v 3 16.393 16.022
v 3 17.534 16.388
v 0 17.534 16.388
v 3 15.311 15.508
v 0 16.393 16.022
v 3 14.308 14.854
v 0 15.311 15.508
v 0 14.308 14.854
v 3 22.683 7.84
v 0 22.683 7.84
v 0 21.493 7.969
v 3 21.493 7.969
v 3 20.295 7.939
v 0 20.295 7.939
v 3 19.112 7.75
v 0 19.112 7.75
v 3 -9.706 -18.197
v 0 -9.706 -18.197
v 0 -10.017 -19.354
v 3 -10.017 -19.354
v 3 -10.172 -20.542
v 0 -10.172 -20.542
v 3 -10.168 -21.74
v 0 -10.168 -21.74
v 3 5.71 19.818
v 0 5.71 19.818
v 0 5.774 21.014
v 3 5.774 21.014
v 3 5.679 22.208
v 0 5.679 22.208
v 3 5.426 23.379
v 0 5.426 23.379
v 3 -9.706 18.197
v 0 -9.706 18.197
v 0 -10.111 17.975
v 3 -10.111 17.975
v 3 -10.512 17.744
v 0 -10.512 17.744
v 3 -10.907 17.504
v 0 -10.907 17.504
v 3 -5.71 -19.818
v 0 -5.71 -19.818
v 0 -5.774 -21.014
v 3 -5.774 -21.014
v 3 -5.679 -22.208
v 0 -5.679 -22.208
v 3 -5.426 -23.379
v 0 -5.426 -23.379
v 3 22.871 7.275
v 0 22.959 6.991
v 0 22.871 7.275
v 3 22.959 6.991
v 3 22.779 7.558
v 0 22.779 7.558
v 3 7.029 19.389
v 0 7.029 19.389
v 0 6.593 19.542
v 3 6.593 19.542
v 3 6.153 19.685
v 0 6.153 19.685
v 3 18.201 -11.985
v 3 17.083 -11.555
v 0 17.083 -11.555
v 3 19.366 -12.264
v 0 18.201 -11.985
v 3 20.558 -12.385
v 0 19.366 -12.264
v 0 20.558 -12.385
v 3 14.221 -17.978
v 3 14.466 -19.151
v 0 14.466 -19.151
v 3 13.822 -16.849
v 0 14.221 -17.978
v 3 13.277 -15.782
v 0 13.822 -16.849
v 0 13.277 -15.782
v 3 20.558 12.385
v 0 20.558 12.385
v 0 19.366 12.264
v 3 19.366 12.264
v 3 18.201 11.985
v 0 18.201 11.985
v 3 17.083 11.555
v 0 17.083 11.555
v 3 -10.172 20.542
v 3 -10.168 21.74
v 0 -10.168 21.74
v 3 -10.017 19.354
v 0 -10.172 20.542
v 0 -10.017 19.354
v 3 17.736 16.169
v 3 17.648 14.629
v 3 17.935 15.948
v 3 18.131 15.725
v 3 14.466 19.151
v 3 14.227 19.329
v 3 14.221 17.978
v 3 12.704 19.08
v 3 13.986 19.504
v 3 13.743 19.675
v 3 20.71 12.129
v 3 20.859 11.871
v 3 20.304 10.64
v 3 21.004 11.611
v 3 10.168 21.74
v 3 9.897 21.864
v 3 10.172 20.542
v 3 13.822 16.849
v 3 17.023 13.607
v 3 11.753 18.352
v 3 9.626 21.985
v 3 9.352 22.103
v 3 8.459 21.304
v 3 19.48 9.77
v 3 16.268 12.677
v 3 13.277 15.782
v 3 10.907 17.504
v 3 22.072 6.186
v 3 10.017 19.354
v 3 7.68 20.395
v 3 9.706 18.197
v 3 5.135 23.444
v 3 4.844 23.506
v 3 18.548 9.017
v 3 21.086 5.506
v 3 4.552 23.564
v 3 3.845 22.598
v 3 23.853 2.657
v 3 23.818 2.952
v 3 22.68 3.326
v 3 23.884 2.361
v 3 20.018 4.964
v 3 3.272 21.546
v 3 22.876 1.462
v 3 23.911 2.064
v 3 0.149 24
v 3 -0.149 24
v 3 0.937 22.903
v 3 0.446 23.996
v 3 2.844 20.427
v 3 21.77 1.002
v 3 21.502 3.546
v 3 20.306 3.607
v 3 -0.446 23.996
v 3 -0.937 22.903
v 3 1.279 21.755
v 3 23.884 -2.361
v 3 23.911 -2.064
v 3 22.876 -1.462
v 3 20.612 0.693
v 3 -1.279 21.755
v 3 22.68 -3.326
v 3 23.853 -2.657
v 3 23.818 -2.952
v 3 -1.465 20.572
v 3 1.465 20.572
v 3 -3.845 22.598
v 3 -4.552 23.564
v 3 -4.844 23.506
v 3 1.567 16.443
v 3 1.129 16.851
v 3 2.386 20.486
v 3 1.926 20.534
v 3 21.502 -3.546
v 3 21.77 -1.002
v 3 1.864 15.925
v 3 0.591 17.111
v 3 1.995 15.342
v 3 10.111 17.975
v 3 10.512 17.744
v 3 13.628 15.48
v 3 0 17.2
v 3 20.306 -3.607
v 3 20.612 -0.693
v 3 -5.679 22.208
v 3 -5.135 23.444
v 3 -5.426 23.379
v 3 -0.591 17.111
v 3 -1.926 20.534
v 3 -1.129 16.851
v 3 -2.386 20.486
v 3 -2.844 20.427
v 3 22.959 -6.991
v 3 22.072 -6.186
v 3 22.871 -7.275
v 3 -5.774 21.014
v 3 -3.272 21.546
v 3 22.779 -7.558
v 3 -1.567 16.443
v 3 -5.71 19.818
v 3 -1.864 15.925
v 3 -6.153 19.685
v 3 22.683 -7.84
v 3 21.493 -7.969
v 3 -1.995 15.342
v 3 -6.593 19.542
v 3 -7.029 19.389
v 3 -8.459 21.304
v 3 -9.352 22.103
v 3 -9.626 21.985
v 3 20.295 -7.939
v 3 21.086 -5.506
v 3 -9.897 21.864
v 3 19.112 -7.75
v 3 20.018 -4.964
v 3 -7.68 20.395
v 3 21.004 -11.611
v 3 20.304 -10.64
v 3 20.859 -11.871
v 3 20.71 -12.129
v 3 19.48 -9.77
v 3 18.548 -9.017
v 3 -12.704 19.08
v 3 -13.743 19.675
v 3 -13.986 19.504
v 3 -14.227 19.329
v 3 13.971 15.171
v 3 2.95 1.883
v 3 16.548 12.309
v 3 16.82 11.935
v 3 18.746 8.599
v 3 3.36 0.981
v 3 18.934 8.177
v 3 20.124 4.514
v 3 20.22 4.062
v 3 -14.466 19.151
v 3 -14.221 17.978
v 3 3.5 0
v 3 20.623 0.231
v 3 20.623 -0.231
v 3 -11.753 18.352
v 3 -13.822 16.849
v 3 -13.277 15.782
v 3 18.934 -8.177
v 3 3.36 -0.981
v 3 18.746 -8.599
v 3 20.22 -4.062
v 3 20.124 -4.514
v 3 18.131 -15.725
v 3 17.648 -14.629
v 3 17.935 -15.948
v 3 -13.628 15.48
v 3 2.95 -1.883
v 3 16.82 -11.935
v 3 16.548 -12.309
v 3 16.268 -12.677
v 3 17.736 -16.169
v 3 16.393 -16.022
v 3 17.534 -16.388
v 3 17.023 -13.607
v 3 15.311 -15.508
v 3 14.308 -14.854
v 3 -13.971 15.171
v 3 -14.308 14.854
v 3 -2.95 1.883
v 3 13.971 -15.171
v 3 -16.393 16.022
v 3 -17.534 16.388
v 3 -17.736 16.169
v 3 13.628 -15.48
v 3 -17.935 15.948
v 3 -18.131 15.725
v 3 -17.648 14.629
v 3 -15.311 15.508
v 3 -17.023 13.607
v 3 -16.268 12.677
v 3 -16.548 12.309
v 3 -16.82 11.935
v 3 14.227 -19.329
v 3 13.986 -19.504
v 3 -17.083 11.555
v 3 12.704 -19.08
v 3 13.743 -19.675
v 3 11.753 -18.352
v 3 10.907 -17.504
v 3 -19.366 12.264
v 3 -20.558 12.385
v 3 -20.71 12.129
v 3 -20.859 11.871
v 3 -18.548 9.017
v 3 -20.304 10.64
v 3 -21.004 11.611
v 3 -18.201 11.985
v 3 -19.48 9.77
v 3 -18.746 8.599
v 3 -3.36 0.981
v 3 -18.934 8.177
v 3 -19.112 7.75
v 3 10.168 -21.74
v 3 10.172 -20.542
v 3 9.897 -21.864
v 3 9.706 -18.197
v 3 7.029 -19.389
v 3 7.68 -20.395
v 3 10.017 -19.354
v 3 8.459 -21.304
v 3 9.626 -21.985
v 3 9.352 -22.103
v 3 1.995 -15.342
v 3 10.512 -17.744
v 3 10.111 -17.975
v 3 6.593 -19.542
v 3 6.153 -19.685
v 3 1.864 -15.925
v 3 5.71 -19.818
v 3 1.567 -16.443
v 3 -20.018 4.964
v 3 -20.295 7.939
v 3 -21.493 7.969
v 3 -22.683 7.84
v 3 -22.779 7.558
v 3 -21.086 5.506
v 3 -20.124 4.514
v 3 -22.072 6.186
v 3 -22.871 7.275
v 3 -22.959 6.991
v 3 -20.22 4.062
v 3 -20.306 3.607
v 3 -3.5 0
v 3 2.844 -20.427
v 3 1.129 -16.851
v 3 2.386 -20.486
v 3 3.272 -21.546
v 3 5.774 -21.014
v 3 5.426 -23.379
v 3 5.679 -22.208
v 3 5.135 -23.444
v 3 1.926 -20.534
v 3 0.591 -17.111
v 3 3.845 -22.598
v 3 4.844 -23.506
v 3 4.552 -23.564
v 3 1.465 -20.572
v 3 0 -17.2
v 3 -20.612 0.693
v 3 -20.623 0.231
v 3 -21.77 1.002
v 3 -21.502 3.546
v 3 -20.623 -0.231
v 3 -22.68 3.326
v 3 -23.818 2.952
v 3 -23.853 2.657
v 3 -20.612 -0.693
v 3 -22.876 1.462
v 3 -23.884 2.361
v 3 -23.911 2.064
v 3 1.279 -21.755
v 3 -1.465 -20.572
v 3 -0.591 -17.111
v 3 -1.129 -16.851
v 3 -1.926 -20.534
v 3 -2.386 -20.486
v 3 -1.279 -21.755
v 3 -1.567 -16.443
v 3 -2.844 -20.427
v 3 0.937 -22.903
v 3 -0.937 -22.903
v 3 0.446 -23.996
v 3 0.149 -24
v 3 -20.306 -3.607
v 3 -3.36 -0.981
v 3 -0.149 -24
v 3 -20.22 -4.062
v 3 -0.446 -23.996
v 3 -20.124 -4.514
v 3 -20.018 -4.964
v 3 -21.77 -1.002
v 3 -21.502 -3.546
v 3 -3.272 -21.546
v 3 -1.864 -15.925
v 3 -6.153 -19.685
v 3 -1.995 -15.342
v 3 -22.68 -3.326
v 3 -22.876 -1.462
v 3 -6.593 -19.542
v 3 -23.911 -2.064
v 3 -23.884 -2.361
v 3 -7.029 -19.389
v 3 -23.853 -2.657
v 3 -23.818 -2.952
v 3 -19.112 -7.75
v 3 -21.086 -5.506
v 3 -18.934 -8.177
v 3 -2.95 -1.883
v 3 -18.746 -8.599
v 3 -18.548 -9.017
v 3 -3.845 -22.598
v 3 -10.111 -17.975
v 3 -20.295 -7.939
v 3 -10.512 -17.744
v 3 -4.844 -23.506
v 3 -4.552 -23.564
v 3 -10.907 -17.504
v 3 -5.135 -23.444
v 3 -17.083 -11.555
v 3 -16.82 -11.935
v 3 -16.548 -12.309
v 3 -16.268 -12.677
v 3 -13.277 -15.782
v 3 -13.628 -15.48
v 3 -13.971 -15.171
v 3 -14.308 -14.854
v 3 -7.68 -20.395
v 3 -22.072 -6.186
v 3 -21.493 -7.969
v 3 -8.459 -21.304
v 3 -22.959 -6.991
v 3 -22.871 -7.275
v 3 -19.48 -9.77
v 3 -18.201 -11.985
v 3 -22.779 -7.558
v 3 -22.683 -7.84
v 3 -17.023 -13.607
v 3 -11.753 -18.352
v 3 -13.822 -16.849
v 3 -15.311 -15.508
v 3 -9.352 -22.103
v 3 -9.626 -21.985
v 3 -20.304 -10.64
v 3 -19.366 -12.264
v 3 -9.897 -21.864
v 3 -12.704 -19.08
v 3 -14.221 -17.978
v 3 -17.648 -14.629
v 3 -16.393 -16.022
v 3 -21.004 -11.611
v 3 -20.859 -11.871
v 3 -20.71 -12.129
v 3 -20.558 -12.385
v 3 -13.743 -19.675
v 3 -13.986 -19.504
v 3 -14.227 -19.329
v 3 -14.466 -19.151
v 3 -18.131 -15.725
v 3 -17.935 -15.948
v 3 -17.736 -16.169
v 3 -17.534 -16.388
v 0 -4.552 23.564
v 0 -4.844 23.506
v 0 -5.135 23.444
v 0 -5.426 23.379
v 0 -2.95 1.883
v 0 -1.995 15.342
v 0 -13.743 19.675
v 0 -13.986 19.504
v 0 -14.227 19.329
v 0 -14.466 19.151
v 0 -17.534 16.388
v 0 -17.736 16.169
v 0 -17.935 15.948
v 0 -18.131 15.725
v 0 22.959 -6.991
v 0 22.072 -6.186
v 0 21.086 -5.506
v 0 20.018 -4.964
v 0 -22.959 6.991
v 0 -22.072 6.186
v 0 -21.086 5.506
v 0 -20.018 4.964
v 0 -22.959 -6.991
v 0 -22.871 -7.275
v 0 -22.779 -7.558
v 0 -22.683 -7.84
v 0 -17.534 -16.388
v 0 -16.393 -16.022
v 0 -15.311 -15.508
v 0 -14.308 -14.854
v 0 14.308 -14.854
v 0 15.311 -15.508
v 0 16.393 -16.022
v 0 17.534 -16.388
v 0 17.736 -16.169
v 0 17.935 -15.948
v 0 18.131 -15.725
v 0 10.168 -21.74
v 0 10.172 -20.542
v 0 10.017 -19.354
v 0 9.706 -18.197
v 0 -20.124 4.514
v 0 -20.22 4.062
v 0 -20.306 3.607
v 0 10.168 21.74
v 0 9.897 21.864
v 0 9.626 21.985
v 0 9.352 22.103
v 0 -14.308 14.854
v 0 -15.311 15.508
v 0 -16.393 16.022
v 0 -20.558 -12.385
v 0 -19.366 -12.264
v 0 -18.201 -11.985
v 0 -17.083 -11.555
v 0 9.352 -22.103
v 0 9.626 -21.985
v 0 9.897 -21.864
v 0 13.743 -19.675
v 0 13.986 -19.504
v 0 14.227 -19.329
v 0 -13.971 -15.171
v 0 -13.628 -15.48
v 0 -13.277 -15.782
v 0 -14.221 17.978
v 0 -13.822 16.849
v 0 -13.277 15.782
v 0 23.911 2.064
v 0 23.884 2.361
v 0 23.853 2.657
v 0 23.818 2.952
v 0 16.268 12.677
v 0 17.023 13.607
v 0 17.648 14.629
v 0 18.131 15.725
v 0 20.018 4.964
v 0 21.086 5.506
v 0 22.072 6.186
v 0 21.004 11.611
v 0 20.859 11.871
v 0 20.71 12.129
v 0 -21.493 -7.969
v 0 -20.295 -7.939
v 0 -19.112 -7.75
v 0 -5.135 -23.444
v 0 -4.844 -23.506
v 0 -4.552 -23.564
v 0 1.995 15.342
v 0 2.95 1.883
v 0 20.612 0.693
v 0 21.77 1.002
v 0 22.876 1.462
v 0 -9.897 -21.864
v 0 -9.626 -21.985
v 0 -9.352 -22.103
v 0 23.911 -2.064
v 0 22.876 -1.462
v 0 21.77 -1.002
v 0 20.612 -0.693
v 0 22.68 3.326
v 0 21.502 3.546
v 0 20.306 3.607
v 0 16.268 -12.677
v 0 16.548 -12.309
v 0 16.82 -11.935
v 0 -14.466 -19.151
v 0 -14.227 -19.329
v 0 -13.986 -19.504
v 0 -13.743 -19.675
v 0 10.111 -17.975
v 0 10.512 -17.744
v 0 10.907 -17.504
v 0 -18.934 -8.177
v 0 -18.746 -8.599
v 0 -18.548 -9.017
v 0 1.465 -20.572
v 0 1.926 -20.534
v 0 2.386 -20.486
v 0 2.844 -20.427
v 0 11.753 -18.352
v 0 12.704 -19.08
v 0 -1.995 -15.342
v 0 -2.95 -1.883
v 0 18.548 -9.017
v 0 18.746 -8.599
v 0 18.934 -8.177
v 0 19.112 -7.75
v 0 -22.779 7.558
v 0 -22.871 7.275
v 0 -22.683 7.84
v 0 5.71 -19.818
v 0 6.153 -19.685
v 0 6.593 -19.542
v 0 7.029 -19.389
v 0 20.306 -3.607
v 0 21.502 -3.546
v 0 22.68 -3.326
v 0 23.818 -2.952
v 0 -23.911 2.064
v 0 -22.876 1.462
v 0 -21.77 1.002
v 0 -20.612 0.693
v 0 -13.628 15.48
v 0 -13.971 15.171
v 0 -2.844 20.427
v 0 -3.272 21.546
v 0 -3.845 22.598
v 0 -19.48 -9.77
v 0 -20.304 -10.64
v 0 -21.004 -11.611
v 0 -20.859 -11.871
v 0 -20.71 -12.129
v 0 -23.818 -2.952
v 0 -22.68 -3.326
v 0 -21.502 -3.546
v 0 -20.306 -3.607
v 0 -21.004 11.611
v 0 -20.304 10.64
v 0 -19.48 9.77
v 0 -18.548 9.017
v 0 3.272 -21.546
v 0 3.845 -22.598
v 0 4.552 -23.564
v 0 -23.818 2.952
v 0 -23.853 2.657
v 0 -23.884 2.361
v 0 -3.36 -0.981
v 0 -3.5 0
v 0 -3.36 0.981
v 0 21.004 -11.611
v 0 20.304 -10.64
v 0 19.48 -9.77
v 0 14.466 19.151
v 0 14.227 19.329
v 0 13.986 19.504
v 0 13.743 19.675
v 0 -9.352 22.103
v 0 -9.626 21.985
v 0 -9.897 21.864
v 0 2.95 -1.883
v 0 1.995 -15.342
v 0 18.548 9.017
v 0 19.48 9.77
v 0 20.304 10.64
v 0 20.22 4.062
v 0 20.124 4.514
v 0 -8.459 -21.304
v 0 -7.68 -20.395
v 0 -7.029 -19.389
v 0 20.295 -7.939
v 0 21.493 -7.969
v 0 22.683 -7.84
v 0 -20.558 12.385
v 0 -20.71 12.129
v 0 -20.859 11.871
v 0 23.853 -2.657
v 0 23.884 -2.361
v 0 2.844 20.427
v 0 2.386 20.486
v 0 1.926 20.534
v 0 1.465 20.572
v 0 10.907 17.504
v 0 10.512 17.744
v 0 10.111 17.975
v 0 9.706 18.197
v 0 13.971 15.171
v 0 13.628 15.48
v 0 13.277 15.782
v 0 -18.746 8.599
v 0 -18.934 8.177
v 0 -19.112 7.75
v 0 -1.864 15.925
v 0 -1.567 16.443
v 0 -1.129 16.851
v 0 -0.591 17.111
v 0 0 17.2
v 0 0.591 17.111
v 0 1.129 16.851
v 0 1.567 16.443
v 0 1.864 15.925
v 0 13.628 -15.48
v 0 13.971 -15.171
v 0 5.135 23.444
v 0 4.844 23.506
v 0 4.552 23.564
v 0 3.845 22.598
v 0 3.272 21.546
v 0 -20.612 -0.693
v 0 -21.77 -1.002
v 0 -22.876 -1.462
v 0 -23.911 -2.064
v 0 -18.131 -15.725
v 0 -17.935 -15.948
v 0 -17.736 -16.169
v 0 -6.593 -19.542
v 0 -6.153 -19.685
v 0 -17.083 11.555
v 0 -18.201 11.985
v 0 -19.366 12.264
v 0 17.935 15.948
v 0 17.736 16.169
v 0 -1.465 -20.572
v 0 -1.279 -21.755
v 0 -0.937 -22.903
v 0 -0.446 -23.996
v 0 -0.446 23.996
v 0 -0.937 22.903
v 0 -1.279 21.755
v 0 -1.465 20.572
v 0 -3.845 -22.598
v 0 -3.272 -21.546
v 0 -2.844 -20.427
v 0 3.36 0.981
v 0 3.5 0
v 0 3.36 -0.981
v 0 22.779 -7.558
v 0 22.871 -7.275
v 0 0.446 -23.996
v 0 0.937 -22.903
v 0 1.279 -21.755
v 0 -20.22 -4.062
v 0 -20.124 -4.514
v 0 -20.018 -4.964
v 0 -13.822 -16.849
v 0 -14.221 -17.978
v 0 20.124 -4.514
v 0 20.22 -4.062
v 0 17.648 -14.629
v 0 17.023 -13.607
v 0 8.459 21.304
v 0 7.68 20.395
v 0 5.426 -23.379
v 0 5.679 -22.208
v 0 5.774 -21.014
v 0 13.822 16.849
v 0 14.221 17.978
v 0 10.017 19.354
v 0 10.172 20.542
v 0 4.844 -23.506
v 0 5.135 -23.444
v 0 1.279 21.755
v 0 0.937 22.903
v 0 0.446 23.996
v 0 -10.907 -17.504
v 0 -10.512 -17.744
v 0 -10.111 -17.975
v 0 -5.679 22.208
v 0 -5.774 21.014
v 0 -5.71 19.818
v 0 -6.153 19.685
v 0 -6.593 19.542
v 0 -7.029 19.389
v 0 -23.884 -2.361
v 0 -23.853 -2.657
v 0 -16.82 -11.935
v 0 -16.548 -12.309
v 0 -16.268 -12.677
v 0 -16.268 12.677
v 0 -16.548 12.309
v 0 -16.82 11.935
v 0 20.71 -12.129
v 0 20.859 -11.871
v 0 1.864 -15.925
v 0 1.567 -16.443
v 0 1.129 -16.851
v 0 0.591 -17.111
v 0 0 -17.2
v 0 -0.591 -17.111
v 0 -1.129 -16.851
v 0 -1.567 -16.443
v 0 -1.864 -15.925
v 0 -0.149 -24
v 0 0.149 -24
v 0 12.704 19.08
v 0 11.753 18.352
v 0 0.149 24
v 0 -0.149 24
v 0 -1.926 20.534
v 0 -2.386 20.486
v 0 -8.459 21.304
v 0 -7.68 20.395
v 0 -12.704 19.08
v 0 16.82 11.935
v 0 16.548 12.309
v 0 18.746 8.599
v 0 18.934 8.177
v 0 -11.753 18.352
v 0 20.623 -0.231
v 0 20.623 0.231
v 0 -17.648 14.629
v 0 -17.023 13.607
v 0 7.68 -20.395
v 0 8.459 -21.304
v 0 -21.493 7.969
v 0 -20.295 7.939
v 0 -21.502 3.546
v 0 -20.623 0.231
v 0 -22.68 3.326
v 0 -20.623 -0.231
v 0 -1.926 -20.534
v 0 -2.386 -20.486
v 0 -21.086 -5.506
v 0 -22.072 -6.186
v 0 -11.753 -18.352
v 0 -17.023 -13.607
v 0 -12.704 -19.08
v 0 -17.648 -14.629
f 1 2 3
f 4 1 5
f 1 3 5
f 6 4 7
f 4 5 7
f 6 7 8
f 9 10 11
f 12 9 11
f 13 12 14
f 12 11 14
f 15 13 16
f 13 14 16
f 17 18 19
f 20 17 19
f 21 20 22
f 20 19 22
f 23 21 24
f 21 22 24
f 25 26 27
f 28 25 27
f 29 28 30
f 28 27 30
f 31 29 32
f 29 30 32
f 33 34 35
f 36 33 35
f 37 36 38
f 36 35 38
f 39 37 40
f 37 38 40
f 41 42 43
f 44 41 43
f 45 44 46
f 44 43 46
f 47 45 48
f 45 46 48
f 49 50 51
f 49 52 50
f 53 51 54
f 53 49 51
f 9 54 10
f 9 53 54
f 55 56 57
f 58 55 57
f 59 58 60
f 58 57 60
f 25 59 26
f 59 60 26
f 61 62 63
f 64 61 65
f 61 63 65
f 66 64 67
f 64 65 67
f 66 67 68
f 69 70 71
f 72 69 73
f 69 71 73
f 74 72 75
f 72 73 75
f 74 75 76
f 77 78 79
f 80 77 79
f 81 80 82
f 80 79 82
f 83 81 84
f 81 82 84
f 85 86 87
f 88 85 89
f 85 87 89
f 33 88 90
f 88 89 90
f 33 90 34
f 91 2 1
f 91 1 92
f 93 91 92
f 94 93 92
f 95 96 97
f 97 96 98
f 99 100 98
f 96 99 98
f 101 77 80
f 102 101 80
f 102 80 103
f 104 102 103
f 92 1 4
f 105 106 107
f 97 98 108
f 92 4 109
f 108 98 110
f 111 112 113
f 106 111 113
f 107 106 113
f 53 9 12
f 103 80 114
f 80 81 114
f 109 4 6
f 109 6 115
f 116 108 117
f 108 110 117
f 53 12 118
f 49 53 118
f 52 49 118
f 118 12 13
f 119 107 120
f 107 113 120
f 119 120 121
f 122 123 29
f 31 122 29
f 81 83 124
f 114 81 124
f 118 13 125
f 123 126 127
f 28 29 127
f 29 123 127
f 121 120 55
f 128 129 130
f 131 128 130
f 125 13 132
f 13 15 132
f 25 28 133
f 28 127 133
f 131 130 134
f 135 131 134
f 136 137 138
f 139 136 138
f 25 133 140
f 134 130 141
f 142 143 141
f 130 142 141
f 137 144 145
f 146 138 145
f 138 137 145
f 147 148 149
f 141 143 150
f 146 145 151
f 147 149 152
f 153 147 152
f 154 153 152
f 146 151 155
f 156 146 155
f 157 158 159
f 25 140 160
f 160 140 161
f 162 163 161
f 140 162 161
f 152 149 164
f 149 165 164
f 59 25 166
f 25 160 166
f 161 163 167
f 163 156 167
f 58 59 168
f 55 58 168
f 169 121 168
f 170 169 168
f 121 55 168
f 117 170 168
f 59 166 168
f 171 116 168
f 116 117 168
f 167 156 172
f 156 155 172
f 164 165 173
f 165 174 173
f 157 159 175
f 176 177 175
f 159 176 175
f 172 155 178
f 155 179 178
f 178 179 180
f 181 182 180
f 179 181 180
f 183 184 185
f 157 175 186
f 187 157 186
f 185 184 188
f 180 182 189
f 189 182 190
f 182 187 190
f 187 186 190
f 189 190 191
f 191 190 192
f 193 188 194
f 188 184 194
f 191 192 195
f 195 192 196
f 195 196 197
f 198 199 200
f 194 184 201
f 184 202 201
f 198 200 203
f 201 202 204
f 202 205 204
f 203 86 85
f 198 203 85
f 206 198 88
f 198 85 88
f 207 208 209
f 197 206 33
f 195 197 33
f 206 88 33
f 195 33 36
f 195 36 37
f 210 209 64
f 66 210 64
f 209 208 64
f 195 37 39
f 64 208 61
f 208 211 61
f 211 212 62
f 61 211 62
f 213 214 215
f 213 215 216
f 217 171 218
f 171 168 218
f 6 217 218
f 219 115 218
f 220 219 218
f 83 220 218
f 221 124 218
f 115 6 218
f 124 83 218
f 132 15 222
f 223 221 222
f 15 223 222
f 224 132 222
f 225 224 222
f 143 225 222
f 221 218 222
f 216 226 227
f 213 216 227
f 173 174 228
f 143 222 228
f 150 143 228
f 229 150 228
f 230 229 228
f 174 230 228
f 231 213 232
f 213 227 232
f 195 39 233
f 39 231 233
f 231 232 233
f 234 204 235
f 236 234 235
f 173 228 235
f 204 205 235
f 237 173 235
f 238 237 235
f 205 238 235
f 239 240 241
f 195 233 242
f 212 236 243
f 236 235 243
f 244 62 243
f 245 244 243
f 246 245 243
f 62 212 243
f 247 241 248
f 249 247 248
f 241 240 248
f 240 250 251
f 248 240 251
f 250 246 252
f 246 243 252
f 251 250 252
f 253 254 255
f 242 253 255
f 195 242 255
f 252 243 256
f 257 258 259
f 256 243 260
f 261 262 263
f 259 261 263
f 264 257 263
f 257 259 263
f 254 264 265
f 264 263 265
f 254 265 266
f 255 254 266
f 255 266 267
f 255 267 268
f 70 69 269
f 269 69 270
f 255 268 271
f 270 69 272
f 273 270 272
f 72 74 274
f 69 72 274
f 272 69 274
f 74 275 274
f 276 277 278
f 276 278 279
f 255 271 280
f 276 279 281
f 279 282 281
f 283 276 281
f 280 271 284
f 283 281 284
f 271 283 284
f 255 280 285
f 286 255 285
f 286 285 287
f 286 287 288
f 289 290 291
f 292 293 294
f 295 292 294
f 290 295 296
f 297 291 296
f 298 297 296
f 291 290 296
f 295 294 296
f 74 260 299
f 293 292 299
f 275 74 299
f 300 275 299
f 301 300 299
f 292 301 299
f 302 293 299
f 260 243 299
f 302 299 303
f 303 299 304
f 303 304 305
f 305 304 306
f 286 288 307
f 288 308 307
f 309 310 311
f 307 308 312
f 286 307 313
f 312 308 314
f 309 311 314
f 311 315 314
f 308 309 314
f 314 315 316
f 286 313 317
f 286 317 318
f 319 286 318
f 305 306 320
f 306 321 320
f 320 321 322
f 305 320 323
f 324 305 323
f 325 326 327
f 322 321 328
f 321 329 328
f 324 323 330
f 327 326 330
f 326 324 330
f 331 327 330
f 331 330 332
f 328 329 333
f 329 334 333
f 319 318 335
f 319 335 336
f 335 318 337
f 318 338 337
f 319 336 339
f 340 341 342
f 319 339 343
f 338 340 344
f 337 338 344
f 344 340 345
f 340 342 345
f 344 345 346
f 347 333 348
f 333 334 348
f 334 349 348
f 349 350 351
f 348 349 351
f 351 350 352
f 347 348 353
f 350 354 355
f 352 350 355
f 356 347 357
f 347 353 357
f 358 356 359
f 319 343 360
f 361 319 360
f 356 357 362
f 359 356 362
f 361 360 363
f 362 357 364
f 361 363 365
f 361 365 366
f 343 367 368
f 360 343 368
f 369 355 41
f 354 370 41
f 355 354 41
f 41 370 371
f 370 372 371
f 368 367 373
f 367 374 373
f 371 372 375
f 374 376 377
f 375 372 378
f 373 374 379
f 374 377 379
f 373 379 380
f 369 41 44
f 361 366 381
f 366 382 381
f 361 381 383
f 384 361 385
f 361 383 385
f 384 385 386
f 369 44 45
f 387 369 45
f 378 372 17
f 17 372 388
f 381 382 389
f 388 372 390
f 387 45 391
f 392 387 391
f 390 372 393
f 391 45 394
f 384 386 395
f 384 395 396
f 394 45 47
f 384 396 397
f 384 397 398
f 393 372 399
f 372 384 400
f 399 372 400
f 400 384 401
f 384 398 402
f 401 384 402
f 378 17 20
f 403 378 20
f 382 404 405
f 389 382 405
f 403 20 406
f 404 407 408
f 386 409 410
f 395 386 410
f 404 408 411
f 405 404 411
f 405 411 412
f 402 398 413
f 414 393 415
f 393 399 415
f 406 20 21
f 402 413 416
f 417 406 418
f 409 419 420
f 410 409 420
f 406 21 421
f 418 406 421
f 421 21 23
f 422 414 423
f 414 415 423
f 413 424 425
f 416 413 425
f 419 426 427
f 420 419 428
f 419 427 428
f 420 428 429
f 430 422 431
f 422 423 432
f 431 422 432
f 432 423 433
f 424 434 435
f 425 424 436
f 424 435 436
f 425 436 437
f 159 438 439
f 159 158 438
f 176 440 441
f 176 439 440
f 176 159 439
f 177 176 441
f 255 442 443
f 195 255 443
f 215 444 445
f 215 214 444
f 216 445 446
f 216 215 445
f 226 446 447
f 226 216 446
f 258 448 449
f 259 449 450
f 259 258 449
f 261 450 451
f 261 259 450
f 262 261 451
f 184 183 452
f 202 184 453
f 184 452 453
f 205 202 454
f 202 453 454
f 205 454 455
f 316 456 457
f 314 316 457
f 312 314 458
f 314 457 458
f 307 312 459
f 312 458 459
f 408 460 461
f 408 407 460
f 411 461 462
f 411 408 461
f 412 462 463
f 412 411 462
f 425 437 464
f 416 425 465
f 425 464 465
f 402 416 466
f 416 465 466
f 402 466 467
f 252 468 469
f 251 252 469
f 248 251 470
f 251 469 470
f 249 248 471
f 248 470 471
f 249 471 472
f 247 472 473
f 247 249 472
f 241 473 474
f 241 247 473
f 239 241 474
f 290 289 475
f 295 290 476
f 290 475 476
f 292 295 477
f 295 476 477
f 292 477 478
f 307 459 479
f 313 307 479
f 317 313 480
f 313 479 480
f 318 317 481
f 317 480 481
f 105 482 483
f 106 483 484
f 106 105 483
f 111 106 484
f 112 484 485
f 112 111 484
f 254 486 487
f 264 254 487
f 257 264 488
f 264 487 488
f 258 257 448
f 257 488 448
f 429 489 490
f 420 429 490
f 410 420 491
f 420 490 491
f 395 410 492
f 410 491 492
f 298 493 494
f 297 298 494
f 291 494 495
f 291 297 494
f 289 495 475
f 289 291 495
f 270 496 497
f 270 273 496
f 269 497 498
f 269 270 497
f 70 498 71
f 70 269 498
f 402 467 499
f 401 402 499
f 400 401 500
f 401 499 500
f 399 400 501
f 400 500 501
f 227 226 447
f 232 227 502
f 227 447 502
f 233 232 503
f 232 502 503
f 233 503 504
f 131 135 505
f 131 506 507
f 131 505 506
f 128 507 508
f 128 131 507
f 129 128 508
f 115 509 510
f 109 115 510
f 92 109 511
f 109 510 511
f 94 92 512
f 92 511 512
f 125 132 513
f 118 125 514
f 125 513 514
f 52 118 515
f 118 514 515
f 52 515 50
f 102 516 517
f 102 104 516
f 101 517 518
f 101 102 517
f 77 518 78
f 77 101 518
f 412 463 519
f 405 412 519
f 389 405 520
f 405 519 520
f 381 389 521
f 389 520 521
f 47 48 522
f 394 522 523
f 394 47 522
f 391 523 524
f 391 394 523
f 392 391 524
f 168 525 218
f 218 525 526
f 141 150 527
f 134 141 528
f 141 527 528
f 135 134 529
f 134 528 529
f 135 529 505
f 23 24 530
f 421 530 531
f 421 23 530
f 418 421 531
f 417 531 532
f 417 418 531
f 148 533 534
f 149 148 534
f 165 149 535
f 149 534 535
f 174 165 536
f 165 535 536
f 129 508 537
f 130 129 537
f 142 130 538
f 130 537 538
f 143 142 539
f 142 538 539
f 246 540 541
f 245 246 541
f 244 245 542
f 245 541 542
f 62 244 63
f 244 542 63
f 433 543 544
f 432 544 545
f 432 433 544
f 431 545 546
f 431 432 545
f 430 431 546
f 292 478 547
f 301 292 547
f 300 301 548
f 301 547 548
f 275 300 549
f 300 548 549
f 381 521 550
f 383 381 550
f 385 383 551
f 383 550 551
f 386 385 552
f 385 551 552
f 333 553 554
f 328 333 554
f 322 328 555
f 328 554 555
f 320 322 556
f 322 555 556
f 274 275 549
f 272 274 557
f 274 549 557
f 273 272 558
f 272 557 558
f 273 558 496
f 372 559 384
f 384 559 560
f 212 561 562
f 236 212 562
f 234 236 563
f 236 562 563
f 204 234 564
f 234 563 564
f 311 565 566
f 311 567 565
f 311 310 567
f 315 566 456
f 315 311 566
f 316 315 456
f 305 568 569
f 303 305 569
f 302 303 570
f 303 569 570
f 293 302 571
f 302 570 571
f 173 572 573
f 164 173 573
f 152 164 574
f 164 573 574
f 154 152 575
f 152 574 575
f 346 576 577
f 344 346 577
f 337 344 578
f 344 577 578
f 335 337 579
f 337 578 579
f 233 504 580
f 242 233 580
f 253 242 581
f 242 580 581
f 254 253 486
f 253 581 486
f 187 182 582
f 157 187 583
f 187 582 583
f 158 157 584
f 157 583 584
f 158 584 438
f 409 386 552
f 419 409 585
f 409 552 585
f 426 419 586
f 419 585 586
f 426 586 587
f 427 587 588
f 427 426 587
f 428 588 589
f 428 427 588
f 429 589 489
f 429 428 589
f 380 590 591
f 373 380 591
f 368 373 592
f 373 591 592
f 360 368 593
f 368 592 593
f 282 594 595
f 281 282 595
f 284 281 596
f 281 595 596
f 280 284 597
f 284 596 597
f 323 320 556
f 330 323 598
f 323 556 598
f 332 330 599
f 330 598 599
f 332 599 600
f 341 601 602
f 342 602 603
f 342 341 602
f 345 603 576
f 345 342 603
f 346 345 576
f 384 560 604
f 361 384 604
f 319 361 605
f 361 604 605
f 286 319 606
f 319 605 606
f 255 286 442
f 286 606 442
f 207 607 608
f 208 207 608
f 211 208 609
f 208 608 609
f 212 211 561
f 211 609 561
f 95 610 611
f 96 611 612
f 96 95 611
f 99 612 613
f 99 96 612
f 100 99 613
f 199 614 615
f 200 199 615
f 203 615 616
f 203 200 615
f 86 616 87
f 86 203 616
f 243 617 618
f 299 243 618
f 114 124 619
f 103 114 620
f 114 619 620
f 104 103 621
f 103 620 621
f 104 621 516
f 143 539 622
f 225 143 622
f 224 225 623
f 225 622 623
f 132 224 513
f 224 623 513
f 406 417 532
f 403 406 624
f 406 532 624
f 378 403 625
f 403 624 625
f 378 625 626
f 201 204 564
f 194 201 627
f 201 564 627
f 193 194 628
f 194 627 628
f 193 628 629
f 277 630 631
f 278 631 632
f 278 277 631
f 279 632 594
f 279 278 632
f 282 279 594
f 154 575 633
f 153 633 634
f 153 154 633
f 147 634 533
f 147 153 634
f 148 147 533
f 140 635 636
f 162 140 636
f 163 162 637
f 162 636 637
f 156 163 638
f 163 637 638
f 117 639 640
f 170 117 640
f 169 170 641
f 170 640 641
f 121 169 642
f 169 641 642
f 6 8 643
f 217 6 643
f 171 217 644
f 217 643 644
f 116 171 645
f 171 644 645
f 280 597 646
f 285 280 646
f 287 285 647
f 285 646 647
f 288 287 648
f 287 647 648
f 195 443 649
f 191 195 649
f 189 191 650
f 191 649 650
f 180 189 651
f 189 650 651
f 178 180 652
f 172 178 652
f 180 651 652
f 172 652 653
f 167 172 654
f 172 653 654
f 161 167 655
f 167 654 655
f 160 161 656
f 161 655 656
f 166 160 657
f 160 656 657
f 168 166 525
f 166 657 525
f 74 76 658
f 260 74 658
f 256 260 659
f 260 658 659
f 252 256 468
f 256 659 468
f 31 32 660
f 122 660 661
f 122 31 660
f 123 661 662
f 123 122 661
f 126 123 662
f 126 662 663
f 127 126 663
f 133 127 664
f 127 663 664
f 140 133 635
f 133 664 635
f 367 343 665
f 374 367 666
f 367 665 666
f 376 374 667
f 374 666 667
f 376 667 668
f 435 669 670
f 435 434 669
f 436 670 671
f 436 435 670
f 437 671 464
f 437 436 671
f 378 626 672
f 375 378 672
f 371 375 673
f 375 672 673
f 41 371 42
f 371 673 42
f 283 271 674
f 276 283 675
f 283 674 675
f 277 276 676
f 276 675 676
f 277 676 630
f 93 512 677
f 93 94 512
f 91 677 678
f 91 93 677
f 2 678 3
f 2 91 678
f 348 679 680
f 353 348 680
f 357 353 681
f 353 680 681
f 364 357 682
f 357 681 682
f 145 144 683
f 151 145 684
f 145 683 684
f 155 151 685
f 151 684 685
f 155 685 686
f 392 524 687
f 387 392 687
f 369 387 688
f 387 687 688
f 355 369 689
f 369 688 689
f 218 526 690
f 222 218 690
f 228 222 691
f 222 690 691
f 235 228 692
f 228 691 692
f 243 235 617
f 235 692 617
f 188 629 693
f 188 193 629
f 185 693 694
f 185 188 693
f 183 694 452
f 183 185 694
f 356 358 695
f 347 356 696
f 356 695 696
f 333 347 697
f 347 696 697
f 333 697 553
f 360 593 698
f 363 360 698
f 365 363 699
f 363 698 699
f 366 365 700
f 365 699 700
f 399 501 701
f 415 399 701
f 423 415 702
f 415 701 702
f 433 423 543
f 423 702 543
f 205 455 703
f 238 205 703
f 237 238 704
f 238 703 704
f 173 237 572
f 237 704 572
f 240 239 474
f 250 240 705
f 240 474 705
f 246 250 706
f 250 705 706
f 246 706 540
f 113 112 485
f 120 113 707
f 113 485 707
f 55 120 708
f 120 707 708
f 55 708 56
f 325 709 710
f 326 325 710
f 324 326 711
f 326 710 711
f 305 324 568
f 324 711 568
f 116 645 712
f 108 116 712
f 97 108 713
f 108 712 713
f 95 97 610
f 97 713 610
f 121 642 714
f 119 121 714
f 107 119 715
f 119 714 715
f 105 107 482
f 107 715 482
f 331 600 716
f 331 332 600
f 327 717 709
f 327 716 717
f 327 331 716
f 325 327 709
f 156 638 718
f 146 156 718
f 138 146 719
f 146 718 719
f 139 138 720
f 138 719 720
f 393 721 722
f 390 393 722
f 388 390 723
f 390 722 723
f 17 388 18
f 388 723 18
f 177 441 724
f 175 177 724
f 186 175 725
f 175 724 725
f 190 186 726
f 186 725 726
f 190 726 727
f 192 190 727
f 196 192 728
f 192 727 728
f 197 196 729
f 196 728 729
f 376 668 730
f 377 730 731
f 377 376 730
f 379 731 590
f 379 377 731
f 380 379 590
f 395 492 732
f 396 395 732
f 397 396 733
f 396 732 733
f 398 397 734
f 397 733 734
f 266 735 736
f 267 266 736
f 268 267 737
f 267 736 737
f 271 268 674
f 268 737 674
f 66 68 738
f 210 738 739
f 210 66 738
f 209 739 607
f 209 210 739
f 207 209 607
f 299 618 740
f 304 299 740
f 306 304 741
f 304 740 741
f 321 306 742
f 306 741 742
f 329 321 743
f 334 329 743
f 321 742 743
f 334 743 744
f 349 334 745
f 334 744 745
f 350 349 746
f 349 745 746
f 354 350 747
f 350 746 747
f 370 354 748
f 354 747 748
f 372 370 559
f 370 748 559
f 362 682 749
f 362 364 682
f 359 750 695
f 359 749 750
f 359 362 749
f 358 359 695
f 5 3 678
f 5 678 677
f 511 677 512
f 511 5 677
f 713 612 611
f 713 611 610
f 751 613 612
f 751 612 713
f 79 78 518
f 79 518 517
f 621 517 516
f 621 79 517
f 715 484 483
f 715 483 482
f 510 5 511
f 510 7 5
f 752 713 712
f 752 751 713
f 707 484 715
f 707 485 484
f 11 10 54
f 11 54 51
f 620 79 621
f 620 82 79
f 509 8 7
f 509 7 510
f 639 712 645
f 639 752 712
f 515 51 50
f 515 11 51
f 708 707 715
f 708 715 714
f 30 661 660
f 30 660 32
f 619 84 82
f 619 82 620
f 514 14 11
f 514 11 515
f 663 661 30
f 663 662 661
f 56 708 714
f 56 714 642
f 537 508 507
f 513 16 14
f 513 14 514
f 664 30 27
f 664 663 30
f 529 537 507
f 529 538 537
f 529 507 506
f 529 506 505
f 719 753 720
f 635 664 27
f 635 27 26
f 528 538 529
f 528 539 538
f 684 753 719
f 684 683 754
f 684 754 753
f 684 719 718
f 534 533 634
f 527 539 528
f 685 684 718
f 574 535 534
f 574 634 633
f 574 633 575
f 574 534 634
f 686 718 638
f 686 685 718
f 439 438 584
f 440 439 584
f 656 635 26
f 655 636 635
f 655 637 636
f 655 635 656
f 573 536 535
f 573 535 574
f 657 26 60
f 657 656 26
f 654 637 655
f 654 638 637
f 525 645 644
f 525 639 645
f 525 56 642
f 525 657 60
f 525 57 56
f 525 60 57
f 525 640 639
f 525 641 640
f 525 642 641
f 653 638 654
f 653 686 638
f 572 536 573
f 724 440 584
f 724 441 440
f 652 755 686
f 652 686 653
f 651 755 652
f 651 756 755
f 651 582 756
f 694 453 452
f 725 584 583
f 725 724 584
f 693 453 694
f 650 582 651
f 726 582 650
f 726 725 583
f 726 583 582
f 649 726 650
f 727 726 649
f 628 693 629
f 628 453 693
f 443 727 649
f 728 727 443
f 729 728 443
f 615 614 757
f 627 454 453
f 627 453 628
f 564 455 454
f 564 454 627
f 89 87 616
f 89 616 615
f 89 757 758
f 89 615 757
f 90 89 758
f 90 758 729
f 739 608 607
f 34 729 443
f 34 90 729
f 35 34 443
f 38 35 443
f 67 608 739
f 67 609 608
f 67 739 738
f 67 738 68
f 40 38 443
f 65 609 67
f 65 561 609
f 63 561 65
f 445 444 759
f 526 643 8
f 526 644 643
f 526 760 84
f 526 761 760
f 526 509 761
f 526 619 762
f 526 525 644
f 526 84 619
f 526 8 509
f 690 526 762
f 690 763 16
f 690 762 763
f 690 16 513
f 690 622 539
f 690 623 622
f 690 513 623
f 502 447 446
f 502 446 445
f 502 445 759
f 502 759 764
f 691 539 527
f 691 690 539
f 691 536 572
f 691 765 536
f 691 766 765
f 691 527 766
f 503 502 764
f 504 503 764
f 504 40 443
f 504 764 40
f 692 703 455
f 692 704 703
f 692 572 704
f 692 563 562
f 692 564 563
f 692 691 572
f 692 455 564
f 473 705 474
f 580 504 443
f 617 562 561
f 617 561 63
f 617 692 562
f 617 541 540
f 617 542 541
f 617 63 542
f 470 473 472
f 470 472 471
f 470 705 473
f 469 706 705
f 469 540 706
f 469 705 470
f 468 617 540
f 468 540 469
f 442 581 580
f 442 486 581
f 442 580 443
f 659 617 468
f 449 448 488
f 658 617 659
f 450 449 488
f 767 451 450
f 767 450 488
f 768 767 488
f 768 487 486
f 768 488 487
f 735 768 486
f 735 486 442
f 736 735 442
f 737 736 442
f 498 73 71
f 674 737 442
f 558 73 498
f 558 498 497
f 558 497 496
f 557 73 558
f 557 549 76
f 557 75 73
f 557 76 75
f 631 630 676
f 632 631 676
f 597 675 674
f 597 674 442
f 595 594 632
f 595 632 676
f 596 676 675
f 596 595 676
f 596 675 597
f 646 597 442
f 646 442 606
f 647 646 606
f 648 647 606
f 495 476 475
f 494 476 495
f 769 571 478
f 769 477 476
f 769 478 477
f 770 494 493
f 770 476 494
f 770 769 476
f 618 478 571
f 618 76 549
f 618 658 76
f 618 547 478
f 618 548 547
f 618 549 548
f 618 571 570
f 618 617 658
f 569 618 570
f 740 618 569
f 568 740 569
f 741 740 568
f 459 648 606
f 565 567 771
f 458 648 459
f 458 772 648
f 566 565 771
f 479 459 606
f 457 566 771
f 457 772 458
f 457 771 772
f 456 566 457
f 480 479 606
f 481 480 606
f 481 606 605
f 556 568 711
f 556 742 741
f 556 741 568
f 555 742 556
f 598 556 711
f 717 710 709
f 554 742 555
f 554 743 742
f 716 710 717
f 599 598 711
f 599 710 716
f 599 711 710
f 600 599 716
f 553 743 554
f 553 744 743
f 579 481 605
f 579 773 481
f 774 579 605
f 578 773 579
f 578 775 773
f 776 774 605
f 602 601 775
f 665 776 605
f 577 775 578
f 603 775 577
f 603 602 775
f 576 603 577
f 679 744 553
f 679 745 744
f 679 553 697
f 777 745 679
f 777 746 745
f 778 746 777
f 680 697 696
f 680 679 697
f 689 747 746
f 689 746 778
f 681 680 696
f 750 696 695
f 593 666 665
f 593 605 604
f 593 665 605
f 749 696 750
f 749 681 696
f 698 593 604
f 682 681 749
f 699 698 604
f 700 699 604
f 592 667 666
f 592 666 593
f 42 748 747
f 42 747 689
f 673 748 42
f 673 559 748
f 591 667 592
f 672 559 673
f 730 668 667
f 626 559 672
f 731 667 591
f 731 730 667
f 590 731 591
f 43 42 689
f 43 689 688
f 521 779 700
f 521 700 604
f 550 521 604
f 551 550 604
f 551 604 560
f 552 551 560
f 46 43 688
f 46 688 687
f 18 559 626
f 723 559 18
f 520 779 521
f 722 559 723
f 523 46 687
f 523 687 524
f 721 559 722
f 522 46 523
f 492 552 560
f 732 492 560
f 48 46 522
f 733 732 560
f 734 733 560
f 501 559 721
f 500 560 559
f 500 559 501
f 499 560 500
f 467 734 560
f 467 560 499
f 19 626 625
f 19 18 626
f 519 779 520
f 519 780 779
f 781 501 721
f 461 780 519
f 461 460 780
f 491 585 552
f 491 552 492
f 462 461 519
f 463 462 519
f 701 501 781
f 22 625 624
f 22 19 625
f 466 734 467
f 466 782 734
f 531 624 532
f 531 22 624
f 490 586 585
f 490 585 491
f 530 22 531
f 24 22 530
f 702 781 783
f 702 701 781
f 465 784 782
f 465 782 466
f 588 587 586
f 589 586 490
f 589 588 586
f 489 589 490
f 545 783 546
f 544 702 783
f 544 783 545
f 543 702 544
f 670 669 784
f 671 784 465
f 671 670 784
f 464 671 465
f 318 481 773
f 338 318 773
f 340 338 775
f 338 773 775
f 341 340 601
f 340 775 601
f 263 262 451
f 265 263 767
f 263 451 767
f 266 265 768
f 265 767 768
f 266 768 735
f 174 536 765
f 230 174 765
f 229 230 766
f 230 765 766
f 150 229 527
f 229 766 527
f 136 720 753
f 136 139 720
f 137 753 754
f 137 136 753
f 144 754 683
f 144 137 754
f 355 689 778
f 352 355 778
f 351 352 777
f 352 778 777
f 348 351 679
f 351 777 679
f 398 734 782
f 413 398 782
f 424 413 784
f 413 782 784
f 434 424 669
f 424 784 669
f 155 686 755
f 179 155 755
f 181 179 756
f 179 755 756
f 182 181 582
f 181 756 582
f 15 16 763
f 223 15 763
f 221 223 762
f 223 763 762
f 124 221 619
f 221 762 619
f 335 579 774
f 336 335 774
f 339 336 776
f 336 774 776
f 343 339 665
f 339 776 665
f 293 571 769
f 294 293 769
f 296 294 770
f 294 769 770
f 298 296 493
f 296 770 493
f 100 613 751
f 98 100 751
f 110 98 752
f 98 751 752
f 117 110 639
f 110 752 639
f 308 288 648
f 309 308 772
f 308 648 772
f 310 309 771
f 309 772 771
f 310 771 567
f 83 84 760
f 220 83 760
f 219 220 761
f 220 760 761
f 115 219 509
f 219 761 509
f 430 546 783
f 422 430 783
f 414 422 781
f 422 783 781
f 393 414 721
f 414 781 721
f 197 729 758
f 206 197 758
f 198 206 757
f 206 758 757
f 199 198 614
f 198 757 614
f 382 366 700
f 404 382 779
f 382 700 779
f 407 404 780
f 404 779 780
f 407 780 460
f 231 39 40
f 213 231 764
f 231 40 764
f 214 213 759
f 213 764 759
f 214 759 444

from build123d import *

# Parameters (mm, degrees)
BASPROSKE_W        = 3
BASPROSKE_H        = 24
TOOTHCUT_DEPTH     = 35.073450075
TEETHCUTS_COUNT    = 30
TEETHCUTS_ANGLE    = 348
BORSKE_R           = 2
BORE_DEPTH         = 50.001016
CUT_EXTRUDE1_DEPTH = 35.010864624


with BuildPart() as part:
    # BasProSke → Base-Revolve (revolve)
    with BuildSketch(Plane(origin=(0, 0, 0), x_dir=(1, 0, 0), z_dir=(0, 1, 0)), mode=Mode.PRIVATE) as base_revolve_sk:
        with Locations((1.5, 12)):
            Rectangle(BASPROSKE_W, BASPROSKE_H)
    revolve(base_revolve_sk.sketch.rotate(Axis((-10, 0, 0), (1, 0, 0)), 180), axis=Axis((-10, 0, 0), (1, 0, 0)))

    # TooCutSke → ToothCut (cut, through all)
    with BuildSketch(Plane(origin=(0, 0, 0), x_dir=(0, 0, -1), z_dir=(1, 0, 0))):
        with BuildLine():
            ThreePointArc((0.693278797, 20.612344372), (0, 20.624), (-0.693278797, 20.612344372))
            ThreePointArc((-0.693278797, 20.612344372), (-1.270739341, 22.465148834), (-2.231973449, 24.151083009))
            ThreePointArc((-2.231973449, 24.151083009), (0, 24.254), (2.231973449, 24.151083009))
            ThreePointArc((2.231973449, 24.151083009), (1.270739341, 22.465148834), (0.693278797, 20.612344372))
        make_face()
    toothcut = extrude(amount=TOOTHCUT_DEPTH, mode=Mode.SUBTRACT)

    # TeethCuts: ToothCut ×30 about axis
    teethcuts_axis = Axis((-10, 0, 0), (1, 0, 0))
    for i in range(1, TEETHCUTS_COUNT):
        add(toothcut.rotate(teethcuts_axis, i * TEETHCUTS_ANGLE / (TEETHCUTS_COUNT - 1)), mode=Mode.SUBTRACT)

    # BorSke → Bore (cut, symmetric)
    with BuildSketch(Plane(origin=(0, 0, 0), x_dir=(0, 0, -1), z_dir=(1, 0, 0))):
        with Locations(Location((0, 0, 0), (0, 0, 180))):
            Circle(BORSKE_R)
    extrude(amount=BORE_DEPTH, both=True, mode=Mode.SUBTRACT)

    # Sketch2 → Cut-Extrude1 (cut, through all)
    with BuildSketch(Plane.ZY):
        with BuildLine():
            Line((-1.88348082, 2.95), (-15.34156858, 1.994983292))
            ThreePointArc((-15.34156858, 1.994983292), (-17.2, 0), (-15.34156858, -1.994983292))
            Line((-15.34156858, -1.994983292), (-1.88348082, -2.95))
            ThreePointArc((-1.88348082, -2.95), (0, -3.5), (1.88348082, -2.95))
            Line((1.88348082, -2.95), (15.34156858, -1.994983292))
            ThreePointArc((15.34156858, -1.994983292), (17.2, 0), (15.34156858, 1.994983292))
            Line((15.34156858, 1.994983292), (1.88348082, 2.95))
            ThreePointArc((1.88348082, 2.95), (0, 3.5), (-1.88348082, 2.95))
        make_face()
    extrude(amount=-CUT_EXTRUDE1_DEPTH, mode=Mode.SUBTRACT)


solid = part.part
